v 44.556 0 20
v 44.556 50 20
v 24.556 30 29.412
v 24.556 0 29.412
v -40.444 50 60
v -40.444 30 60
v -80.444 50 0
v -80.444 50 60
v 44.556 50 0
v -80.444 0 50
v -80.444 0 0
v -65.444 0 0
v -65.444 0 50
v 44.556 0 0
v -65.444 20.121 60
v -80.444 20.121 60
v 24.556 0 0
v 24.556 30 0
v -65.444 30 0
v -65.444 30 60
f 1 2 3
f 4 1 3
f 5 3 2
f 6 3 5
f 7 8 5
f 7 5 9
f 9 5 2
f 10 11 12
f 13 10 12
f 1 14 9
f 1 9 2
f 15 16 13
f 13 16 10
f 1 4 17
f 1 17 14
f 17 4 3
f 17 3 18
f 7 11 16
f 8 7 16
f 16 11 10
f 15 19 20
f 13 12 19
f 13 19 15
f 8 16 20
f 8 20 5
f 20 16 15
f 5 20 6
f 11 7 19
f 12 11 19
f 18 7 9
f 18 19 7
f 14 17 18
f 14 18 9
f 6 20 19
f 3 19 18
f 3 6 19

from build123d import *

# Parameters (mm, degrees)
F2_DEPTH = 50
F3_DEPTH = 30
F4_DEPTH = 50
F1_W     = 15
F1_H     = 60
F5_DEPTH = 50
F7_DEPTH = 15


with BuildPart() as f2:
    # F1 (on Front) → F2 (new body)
    with BuildSketch(Plane.XZ):
        Polygon((-65.4444598283, 60), (-65.4444598283, 0), (24.5555401717, 0), (24.5555401717, 29.4117647059), (-40.4444598283, 60), align=None)
    extrude(amount=-F2_DEPTH)

    # F3 (cut): a face of the model
    f3_faces = [f2.faces().sort_by_distance(p)[0] for p in [
        (-25.7092573361, 0, 25.5315584178),
    ]]
    extrude(f3_faces, amount=-F3_DEPTH, mode=Mode.SUBTRACT)

    # F1 (on Front) → F4 (join)
    with BuildSketch(Plane.XZ):
        Polygon((24.5555401717, 29.4117647059), (24.5555401717, 0), (44.5555401717, 0), (44.5555401717, 20), align=None)
    extrude(amount=-F4_DEPTH)

    # F1 (on Front) → F5 (join)
    with BuildSketch(Plane.XZ):
        with Locations((-72.9444598283, 30)):
            Rectangle(F1_W, F1_H)
    extrude(amount=-F5_DEPTH)

    # F6 (on face) → F7 (cut)
    with BuildSketch(Plane(origin=(-80.4444598283, 0, 0), x_dir=(0, -1, 0), z_dir=(-1, 0, 0))):
        Polygon((-20.1208200306, 60), (0, 50), (0, 60), align=None)
    extrude(amount=-F7_DEPTH, mode=Mode.SUBTRACT)


solid = f2.part
